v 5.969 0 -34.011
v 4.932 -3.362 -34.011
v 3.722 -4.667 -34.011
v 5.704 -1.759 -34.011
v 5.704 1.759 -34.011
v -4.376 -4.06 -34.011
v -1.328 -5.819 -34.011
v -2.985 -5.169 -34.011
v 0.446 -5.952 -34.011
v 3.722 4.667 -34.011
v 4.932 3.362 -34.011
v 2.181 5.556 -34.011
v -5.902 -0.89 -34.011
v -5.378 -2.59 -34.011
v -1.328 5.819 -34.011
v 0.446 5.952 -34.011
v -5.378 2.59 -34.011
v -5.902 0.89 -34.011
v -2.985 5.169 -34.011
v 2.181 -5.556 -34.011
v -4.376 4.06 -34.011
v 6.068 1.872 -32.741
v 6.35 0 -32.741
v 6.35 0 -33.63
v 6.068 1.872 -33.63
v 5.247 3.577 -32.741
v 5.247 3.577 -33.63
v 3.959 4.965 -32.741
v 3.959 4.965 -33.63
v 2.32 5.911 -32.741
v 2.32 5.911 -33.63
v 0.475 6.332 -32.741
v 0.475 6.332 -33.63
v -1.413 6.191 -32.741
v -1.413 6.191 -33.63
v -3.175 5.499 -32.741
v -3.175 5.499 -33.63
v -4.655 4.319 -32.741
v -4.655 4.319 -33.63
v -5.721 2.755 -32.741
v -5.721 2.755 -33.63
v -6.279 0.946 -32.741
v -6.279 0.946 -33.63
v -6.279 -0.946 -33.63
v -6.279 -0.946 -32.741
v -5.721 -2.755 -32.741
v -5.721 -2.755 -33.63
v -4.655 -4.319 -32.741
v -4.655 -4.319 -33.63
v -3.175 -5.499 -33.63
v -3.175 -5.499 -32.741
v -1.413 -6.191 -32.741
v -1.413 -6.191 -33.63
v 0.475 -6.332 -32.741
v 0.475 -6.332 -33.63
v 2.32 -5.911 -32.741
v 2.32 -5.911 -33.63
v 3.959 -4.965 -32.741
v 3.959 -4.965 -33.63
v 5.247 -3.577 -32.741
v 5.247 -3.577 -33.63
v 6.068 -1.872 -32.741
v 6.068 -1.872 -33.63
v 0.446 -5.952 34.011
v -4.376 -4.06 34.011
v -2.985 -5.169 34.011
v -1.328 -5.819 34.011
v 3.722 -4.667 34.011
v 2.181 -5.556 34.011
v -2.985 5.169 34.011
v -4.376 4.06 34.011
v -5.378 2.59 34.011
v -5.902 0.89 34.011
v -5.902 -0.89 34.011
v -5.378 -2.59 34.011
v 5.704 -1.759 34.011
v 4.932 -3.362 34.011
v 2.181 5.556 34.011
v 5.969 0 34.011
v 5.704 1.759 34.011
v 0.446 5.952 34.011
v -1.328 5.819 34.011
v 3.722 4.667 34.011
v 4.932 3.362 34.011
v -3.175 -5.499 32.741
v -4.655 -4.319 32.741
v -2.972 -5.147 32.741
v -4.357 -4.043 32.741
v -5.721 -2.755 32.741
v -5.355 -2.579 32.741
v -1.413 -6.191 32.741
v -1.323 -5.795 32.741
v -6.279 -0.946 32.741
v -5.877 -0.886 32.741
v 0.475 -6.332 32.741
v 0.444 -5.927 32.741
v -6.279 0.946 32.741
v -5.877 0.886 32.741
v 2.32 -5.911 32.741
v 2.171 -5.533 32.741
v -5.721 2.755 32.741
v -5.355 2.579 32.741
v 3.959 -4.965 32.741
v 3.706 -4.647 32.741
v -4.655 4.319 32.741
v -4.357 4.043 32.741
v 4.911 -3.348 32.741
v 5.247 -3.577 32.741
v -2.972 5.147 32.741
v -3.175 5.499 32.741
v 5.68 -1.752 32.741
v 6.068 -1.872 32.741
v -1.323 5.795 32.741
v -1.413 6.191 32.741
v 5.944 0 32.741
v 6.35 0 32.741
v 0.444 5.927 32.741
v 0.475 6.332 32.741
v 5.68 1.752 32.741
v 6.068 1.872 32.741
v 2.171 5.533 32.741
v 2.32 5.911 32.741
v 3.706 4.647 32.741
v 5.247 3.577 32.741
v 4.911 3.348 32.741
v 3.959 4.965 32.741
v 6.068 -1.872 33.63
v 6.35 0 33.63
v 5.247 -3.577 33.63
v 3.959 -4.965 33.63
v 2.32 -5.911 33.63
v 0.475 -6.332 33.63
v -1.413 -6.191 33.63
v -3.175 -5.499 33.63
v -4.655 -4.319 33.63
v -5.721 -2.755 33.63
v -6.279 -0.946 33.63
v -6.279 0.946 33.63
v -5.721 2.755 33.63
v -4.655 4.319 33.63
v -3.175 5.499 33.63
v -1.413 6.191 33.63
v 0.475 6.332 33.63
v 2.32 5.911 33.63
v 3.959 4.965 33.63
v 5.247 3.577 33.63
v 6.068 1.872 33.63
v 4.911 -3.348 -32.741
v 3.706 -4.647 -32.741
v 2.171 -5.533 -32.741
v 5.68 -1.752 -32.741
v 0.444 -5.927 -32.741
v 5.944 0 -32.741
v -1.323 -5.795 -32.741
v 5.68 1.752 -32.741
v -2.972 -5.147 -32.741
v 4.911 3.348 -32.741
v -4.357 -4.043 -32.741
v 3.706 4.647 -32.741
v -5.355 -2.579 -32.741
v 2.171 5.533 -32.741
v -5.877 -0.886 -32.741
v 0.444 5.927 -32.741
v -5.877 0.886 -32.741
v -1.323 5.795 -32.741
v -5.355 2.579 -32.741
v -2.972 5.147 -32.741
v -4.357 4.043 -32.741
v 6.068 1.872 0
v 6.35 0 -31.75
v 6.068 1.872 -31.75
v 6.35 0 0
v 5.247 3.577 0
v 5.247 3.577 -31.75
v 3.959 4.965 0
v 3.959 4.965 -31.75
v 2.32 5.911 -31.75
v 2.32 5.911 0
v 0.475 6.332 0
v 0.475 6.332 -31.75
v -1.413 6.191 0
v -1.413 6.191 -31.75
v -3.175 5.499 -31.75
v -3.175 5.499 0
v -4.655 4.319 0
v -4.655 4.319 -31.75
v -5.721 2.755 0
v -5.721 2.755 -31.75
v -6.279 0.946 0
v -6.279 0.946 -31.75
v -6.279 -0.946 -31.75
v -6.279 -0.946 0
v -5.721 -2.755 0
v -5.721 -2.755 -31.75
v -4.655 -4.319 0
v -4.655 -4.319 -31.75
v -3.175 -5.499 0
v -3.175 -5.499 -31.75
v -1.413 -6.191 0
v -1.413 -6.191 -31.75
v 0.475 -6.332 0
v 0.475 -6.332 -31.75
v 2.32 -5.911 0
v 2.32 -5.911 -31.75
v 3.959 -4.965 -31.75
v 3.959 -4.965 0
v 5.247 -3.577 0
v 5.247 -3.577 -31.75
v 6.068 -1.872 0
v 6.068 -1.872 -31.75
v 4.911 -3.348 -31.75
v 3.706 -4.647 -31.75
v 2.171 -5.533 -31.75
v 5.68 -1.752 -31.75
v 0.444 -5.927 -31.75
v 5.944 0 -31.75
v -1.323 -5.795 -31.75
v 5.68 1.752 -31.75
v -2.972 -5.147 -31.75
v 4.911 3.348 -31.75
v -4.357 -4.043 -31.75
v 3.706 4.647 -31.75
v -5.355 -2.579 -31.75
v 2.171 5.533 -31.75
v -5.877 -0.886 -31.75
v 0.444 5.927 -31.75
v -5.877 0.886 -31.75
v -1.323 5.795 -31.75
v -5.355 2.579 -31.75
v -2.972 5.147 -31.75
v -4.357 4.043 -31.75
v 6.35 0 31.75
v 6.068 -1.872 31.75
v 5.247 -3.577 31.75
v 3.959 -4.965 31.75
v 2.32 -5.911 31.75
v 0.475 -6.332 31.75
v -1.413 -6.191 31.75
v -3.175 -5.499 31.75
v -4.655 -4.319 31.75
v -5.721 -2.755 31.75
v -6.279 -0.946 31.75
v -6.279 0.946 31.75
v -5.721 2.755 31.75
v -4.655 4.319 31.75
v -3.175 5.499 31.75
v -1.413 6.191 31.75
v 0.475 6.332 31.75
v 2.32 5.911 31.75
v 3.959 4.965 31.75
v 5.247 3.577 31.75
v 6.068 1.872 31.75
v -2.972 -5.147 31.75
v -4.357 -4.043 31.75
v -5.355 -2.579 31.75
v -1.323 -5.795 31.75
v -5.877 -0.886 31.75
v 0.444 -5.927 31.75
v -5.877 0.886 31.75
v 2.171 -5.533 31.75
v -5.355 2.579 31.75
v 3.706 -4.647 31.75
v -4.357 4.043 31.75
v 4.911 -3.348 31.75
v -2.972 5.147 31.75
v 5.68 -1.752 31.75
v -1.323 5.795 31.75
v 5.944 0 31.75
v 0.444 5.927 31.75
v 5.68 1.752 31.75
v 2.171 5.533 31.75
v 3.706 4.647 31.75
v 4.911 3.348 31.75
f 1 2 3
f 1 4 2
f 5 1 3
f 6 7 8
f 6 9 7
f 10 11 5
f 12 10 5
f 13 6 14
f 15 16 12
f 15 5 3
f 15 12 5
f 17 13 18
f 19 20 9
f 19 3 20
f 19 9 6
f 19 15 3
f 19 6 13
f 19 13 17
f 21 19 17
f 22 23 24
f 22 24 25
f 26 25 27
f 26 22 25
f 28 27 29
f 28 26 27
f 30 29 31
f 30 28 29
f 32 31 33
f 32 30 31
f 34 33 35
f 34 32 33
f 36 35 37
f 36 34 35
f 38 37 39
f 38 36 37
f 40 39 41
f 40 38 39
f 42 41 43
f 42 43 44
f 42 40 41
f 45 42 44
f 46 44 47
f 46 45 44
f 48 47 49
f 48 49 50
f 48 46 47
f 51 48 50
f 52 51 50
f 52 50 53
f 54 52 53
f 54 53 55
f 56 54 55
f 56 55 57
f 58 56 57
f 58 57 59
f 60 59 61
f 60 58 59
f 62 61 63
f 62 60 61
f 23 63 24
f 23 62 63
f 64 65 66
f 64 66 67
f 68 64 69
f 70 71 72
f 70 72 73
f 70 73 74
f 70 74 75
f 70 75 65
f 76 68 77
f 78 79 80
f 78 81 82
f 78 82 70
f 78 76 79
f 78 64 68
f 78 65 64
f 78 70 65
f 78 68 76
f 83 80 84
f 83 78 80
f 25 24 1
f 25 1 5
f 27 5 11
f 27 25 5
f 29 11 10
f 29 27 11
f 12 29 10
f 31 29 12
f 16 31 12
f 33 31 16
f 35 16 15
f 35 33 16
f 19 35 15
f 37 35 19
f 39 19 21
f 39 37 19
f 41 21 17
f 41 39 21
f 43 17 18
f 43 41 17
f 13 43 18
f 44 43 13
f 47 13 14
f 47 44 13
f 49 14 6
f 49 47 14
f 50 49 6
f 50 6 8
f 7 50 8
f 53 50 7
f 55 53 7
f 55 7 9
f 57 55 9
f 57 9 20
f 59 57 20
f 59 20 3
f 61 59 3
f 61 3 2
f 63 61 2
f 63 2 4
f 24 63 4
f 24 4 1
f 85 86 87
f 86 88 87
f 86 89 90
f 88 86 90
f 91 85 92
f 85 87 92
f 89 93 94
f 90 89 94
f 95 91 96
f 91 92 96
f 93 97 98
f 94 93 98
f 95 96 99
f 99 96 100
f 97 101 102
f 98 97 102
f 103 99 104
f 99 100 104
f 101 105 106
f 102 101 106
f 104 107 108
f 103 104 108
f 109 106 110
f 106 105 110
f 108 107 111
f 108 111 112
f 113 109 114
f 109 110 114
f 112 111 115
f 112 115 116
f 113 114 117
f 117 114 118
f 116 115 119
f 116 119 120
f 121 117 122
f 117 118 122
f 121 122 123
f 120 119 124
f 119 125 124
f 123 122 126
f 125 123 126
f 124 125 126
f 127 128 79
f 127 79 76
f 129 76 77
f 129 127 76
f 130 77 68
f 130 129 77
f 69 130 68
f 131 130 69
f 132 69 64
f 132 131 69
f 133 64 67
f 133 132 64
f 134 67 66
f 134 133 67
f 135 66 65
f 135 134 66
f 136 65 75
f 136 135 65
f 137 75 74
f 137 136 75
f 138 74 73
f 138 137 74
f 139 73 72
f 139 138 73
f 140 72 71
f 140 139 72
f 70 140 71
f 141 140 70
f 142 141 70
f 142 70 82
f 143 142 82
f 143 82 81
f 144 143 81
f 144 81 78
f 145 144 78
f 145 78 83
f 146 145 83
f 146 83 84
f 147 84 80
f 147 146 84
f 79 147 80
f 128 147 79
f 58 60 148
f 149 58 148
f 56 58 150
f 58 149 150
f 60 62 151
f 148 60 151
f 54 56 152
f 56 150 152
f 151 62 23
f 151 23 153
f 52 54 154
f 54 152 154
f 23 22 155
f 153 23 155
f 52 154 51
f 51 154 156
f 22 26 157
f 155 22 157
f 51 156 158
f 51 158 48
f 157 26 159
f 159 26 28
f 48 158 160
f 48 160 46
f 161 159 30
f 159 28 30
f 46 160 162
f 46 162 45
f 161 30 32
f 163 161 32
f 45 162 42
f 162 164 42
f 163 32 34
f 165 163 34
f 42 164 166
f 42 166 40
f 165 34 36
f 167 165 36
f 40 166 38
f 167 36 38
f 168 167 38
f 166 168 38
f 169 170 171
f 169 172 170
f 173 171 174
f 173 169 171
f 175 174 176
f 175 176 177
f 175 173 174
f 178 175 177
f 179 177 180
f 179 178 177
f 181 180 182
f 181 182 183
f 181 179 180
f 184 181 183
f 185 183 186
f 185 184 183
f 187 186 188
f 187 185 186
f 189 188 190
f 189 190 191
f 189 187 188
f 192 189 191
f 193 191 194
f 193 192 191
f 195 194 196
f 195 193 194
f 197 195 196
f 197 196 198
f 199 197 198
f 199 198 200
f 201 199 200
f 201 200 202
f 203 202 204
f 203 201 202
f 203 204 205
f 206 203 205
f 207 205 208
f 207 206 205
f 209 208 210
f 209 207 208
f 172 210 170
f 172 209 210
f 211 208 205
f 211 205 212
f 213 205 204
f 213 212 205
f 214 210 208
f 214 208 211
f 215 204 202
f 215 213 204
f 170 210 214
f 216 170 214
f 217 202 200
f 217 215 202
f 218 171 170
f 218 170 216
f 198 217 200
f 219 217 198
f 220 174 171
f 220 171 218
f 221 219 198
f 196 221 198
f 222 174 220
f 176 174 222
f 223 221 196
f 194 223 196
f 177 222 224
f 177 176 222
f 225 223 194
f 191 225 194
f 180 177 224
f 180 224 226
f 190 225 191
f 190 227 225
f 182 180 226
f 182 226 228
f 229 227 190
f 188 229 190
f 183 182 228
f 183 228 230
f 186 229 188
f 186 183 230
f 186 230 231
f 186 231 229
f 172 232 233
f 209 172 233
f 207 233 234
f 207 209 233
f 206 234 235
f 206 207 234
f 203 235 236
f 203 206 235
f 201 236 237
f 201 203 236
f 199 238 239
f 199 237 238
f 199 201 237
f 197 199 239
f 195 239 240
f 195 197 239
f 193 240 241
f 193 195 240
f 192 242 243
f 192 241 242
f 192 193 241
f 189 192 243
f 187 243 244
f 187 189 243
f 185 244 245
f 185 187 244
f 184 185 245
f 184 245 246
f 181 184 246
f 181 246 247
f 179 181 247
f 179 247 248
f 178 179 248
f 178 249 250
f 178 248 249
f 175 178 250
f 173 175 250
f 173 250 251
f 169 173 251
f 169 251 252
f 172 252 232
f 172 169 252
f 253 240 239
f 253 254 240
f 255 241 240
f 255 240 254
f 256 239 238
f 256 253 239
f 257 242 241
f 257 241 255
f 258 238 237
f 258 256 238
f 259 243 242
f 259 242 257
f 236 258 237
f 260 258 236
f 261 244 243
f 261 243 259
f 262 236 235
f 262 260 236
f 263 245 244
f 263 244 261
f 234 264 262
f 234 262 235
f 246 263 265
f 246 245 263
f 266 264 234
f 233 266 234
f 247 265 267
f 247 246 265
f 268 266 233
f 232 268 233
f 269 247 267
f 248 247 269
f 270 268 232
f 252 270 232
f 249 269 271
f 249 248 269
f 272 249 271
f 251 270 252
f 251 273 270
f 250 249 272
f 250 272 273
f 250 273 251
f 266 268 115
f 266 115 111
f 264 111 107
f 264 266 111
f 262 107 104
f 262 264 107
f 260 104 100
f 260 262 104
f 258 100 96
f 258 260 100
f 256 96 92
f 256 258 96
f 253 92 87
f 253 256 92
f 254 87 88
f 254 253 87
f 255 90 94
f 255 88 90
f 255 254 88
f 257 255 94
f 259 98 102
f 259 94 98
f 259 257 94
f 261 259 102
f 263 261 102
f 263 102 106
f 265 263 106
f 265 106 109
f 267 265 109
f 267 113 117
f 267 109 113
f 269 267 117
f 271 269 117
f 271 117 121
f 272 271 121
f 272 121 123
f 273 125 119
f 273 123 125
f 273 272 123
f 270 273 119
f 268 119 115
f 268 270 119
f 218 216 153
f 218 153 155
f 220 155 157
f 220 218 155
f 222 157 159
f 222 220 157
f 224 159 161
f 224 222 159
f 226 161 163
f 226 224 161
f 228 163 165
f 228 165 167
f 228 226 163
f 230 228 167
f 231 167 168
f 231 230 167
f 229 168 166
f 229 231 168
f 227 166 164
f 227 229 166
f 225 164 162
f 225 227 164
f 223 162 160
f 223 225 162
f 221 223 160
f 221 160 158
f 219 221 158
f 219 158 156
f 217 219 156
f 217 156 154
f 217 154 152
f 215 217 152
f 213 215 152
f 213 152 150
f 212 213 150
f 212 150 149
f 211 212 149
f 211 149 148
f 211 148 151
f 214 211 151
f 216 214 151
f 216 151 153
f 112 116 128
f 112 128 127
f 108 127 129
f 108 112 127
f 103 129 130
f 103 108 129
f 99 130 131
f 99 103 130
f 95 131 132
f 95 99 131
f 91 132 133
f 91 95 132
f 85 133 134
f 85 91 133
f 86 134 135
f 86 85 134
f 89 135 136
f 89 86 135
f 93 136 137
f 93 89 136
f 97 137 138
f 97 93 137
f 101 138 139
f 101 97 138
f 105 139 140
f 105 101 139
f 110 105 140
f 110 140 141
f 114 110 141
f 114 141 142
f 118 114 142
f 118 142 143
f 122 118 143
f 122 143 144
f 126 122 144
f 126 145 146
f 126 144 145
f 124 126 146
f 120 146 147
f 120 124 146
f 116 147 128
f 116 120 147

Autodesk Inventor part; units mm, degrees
ref_plane "YZ Plane" through (0, 0, 0) normal (1, 0, 0) x (0, 1, 0)
ref_plane "XZ Plane" through (0, 0, 0) normal (0, 1, 0) x (-1, 0, 0)
ref_plane "XY Plane" through (0, 0, 0) normal (0, 0, 1) x (1, 0, 0)
sketch "Sketch1" plane through (0, 0, 0) normal (0, 0, 1) x (1, 0, 0)
  circle A0 centre (0, 0) radius 6.35
  dimension "d0" = 12.7
extrude "Extrusion1" add sketch "Sketch1" along normal blind 31.75
sketch "Sketch6" plane through (0, 0, 31.75) normal (0, 0, 1) x (1, 0, 0)
  circle A0 centre (0, 0) radius 6.35 projected
  circle A1 centre (0, 0) radius 5.9436
  dimension "d18" = 11.8872
extrude "Extrusion6" add sketch "Sketch6" along normal blind 0.9906 contours A1
sketch "Sketch7" plane through (0, 0, 32.7406) normal (0, 0, 1) x (1, 0, 0)
  circle A0 centre (0, 0) radius 6.35 projected
extrude "Extrusion7" add sketch "Sketch7" along normal blind 1.27
chamfer "Chamfer1" distance 0.381 angle 45 1 edges at (-6.35, 0, 34.0106)
mirror "Mirror2" about plane through (0, 0, 0) normal (0, 0, -1)
properties part number "Carriage Shaft - Lower" material "Aluminum 6061"
